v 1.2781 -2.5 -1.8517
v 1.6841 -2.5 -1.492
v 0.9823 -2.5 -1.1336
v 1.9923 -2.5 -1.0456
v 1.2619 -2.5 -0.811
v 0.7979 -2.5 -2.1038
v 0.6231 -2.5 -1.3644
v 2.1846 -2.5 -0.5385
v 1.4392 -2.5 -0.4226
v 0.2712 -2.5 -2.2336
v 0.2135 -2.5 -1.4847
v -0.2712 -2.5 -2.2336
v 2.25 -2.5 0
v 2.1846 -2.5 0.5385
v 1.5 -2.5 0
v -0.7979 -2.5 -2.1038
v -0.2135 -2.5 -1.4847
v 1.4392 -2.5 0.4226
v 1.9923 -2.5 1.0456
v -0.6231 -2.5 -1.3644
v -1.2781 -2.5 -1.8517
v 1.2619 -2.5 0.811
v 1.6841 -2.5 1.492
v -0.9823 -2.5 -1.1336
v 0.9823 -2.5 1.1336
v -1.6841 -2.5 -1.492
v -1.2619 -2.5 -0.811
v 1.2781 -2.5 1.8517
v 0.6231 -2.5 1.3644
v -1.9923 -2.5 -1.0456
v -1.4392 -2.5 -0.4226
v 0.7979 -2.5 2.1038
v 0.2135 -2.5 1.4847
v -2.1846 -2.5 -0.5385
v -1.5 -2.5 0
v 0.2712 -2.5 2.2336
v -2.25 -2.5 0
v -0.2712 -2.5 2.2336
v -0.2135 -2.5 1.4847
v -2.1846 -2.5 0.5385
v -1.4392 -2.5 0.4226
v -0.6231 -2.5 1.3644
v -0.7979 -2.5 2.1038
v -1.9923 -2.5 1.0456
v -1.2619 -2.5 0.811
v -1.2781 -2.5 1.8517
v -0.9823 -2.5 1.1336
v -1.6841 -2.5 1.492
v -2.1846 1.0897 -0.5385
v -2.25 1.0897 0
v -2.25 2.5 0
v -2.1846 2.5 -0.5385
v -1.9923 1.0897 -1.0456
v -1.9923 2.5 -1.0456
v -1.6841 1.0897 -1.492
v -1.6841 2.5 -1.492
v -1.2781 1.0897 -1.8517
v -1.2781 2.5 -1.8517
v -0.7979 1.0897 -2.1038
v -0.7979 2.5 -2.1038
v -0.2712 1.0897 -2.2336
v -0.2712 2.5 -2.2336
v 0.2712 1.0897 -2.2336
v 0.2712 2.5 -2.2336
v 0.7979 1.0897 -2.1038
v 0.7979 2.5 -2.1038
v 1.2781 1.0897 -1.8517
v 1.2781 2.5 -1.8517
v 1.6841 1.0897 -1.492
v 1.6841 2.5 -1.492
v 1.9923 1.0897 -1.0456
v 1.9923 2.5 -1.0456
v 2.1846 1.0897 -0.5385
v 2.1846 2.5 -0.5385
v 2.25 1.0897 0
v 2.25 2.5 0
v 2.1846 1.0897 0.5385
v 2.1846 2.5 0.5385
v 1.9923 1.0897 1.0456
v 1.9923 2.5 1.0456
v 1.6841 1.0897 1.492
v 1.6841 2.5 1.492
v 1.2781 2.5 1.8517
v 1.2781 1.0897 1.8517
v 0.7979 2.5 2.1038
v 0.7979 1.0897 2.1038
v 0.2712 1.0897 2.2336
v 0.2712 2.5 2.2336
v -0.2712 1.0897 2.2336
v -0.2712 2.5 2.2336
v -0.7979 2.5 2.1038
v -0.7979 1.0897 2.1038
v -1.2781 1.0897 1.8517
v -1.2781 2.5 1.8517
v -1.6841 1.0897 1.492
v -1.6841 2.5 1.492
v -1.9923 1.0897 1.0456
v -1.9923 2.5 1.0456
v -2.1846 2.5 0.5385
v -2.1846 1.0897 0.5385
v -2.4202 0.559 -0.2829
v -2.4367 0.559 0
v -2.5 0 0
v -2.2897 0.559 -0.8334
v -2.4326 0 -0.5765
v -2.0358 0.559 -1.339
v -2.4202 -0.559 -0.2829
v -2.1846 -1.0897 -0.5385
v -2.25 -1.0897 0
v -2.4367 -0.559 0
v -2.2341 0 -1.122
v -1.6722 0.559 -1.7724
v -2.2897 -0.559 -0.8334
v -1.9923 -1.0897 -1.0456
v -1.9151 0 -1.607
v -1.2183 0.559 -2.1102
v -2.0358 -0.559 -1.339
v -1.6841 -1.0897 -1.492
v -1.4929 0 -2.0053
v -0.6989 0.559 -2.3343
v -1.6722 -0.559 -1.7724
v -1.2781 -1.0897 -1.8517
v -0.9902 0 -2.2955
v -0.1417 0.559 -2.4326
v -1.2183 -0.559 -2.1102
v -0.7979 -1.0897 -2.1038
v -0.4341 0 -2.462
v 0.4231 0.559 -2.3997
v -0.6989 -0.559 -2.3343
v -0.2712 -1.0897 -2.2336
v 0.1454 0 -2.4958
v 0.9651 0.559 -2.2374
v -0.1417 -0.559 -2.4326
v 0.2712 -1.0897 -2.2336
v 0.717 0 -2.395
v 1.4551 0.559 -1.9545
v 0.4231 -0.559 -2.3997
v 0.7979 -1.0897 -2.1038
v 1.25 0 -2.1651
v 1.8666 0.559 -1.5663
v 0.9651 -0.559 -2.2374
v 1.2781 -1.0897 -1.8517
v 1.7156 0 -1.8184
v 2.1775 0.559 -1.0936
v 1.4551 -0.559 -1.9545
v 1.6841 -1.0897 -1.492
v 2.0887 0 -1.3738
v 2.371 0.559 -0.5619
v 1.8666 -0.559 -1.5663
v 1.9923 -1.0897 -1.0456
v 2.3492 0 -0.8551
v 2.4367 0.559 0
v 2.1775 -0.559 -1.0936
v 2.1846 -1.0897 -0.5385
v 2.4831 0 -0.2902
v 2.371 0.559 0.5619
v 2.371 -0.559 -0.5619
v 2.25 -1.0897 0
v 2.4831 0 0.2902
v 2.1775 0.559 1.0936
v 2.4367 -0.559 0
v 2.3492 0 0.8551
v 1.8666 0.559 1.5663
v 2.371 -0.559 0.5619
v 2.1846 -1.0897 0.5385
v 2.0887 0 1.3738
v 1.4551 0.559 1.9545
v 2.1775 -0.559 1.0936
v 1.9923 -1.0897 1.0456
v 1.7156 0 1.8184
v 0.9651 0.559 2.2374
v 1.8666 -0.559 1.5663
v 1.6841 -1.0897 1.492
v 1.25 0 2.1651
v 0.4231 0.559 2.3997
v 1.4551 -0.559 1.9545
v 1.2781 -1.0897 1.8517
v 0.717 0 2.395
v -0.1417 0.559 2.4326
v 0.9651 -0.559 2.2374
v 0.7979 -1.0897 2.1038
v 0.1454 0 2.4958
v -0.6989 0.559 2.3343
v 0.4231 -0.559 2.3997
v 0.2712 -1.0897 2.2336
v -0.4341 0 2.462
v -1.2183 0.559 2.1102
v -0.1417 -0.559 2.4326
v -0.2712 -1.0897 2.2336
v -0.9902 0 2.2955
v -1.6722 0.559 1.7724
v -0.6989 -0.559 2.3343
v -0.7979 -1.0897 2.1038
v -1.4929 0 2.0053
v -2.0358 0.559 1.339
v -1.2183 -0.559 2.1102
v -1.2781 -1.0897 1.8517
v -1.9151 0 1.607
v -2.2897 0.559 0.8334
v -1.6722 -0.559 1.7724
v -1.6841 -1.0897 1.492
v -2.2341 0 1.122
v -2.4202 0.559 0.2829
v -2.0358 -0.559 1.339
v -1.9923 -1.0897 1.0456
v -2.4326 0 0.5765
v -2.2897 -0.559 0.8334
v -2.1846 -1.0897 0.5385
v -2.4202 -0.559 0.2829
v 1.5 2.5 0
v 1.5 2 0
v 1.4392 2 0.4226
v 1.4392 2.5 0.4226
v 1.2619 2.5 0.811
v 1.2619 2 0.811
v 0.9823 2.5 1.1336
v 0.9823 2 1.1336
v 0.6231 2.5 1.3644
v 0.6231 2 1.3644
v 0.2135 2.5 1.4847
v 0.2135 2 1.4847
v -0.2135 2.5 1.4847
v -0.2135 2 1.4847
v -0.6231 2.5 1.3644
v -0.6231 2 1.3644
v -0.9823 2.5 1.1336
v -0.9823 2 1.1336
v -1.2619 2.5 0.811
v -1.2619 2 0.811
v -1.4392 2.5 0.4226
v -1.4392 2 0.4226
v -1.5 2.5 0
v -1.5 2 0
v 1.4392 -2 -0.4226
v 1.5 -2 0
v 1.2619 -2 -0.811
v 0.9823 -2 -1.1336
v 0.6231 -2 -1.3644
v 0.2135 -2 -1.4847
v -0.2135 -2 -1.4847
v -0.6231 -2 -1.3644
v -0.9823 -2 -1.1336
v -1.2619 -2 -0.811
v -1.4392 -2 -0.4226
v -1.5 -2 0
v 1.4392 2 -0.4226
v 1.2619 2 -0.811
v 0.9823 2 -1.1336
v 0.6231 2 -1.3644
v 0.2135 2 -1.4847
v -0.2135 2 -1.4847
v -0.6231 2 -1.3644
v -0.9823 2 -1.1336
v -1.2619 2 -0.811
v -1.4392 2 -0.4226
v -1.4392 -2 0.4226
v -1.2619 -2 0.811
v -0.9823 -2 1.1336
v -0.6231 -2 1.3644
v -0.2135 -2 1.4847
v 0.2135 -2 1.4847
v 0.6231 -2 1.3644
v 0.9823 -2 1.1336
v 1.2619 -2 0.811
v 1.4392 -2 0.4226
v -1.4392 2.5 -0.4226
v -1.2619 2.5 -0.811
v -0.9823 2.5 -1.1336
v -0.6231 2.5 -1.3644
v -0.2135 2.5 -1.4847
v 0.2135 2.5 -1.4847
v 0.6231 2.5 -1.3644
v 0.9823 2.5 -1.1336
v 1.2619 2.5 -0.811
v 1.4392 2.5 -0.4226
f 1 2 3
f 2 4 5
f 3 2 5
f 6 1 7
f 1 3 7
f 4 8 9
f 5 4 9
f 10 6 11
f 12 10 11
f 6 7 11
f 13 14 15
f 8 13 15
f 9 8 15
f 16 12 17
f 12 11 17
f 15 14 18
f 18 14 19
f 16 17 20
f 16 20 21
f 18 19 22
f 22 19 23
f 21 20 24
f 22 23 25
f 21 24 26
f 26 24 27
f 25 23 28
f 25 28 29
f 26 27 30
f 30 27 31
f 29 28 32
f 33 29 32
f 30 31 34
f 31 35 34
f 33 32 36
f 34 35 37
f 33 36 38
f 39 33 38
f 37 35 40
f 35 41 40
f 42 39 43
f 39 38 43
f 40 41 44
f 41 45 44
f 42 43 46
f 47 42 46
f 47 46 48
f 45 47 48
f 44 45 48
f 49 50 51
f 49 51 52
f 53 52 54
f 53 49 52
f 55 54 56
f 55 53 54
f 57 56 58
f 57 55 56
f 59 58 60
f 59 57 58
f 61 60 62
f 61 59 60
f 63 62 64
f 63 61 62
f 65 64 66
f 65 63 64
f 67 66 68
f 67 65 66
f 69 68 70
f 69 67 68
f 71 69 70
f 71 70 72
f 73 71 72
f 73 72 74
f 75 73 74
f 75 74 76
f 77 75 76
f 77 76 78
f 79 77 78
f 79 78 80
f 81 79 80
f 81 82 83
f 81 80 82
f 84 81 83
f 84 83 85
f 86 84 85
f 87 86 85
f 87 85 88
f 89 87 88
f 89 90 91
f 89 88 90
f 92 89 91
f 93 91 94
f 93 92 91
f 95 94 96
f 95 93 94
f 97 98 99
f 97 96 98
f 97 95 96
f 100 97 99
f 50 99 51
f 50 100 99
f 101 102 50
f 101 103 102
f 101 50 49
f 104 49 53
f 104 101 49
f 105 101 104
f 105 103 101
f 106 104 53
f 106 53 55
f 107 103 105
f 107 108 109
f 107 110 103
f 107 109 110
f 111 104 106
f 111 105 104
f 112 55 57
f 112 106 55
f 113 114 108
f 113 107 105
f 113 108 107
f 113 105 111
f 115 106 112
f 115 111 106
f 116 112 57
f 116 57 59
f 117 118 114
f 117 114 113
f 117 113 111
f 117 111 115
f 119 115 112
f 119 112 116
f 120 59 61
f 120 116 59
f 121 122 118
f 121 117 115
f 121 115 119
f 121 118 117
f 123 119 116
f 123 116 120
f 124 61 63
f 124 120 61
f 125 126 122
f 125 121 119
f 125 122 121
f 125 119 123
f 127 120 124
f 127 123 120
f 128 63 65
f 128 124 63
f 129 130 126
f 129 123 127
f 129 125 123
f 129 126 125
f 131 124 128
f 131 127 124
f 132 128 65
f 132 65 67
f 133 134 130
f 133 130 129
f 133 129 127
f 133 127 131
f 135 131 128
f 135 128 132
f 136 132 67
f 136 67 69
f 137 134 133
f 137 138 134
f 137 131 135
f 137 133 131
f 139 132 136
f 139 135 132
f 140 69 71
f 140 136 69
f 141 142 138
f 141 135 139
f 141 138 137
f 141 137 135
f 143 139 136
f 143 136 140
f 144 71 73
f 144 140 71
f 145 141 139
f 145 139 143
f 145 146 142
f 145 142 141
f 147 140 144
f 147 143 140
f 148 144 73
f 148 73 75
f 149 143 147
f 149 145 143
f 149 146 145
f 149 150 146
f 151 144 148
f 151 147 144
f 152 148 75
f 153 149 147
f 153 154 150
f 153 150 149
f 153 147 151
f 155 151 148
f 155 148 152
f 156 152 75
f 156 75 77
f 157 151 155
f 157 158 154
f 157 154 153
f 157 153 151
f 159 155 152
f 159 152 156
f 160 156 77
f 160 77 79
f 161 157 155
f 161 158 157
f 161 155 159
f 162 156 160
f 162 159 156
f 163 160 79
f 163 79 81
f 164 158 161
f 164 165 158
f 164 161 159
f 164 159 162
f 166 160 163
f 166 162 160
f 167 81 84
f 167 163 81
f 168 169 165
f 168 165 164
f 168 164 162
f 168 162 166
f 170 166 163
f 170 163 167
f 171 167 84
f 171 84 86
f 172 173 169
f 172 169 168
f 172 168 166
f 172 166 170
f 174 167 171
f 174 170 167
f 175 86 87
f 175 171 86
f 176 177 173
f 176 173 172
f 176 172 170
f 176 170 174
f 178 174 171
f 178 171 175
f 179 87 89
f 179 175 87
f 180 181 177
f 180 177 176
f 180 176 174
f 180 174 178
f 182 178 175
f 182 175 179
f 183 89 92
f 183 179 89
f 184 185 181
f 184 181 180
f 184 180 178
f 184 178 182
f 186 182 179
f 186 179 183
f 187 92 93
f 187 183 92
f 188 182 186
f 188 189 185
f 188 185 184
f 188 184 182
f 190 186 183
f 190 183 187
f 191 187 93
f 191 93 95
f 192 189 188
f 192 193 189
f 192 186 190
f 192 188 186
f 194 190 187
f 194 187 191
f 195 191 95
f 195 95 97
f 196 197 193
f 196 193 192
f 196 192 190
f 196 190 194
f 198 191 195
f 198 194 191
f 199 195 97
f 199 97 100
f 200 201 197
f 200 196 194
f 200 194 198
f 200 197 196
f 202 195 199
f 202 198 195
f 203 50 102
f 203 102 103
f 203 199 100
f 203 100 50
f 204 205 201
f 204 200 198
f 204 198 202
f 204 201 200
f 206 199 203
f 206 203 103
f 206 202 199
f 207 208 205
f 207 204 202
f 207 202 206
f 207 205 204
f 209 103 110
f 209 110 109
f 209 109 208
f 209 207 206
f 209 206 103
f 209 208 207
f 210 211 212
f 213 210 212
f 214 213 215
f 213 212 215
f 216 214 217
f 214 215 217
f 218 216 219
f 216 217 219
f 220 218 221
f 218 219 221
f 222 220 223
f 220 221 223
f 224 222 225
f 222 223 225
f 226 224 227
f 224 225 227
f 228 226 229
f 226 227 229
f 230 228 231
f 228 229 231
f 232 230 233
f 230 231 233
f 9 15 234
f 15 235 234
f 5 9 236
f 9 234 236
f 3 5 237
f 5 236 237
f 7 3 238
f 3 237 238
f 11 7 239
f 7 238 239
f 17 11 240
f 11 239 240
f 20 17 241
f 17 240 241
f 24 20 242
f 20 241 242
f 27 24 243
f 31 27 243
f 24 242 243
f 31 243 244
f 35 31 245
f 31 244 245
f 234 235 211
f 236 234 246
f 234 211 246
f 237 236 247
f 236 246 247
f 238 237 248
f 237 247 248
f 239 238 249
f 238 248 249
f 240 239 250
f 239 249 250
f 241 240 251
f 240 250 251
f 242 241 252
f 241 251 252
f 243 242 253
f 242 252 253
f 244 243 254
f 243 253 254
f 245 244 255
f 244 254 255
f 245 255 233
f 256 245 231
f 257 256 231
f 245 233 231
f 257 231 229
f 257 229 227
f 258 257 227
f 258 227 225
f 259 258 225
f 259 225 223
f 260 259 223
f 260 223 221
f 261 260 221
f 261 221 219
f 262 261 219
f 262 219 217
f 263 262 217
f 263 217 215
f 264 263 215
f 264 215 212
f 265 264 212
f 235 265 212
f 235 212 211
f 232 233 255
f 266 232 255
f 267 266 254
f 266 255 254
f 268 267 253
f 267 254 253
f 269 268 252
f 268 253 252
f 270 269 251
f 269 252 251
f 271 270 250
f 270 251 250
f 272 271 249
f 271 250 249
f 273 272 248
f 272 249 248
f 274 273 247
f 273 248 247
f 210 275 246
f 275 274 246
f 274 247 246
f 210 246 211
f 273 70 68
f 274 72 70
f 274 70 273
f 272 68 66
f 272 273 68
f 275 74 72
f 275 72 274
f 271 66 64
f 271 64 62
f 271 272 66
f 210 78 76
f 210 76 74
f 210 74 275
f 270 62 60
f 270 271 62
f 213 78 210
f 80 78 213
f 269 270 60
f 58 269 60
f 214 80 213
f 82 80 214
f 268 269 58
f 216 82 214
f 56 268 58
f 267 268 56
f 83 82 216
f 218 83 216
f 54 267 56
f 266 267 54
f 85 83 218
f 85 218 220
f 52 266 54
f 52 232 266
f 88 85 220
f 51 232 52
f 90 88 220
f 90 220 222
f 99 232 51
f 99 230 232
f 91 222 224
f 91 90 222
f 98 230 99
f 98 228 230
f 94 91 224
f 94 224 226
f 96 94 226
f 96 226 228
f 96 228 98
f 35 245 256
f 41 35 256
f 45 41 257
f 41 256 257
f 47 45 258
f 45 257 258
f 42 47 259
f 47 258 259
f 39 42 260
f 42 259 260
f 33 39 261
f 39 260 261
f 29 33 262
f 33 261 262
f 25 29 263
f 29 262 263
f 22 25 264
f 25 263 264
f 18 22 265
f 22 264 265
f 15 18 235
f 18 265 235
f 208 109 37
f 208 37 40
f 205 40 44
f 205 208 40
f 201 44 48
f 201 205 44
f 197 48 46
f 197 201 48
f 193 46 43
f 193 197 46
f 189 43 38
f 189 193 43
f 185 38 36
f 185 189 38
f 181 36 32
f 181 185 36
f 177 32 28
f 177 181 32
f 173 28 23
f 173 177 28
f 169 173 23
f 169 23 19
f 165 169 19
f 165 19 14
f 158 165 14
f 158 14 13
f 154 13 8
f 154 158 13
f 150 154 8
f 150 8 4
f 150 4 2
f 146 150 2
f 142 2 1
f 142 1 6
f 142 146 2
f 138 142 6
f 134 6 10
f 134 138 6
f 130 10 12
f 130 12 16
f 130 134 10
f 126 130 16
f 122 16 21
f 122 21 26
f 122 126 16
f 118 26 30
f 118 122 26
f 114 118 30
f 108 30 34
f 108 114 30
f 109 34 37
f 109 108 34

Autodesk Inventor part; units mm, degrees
ref_plane "YZ Plane" through (0, 0, 0) normal (1, 0, 0) x (0, 1, 0)
ref_plane "XZ Plane" through (0, 0, 0) normal (0, 1, 0) x (-1, 0, 0)
ref_plane "XY Plane" through (0, 0, 0) normal (0, 0, 1) x (1, 0, 0)
sketch "スケッチ1" plane through (0, 0, 0) normal (0, 0, 1) x (1, 0, 0)
  line L0 (0, 0) -> (0, 2.5)
  line L1 (0, 0) -> (0, -2.5)
  arc A0 (0, 2.5) -> (0, -2.5) centre (0, 0) ccw
  dimension "d0" = 2.5
  dimension "d1" = 2.5
  dimension "d2" = 2.5
revolve "回転1" add sketch "スケッチ1" angle 360 about axis through (0, 0, 0) along (0, 1, 0)
sketch "スケッチ2" plane through (0, 0, 0) normal (0, 1, 0) x (-1, 0, 0)
  circle A0 centre (0, 0) radius 1.5
  circle A1 centre (0, 0) radius 2.25
  dimension "d4" = 3
  dimension "d5" = 4.5
extrude "押し出し1" add sketch "スケッチ2" along normal mid plane 5
sketch "スケッチ3" plane through (0, 2.5, 0) normal (0, 1, 0) x (1, 0, 0)
  circle A0 centre (0, 0) radius 1.5 projected
extrude "押し出し2" cut sketch "スケッチ3" against normal through all
properties part number "タミヤダンパー8" material "アセタール樹脂、黒"
